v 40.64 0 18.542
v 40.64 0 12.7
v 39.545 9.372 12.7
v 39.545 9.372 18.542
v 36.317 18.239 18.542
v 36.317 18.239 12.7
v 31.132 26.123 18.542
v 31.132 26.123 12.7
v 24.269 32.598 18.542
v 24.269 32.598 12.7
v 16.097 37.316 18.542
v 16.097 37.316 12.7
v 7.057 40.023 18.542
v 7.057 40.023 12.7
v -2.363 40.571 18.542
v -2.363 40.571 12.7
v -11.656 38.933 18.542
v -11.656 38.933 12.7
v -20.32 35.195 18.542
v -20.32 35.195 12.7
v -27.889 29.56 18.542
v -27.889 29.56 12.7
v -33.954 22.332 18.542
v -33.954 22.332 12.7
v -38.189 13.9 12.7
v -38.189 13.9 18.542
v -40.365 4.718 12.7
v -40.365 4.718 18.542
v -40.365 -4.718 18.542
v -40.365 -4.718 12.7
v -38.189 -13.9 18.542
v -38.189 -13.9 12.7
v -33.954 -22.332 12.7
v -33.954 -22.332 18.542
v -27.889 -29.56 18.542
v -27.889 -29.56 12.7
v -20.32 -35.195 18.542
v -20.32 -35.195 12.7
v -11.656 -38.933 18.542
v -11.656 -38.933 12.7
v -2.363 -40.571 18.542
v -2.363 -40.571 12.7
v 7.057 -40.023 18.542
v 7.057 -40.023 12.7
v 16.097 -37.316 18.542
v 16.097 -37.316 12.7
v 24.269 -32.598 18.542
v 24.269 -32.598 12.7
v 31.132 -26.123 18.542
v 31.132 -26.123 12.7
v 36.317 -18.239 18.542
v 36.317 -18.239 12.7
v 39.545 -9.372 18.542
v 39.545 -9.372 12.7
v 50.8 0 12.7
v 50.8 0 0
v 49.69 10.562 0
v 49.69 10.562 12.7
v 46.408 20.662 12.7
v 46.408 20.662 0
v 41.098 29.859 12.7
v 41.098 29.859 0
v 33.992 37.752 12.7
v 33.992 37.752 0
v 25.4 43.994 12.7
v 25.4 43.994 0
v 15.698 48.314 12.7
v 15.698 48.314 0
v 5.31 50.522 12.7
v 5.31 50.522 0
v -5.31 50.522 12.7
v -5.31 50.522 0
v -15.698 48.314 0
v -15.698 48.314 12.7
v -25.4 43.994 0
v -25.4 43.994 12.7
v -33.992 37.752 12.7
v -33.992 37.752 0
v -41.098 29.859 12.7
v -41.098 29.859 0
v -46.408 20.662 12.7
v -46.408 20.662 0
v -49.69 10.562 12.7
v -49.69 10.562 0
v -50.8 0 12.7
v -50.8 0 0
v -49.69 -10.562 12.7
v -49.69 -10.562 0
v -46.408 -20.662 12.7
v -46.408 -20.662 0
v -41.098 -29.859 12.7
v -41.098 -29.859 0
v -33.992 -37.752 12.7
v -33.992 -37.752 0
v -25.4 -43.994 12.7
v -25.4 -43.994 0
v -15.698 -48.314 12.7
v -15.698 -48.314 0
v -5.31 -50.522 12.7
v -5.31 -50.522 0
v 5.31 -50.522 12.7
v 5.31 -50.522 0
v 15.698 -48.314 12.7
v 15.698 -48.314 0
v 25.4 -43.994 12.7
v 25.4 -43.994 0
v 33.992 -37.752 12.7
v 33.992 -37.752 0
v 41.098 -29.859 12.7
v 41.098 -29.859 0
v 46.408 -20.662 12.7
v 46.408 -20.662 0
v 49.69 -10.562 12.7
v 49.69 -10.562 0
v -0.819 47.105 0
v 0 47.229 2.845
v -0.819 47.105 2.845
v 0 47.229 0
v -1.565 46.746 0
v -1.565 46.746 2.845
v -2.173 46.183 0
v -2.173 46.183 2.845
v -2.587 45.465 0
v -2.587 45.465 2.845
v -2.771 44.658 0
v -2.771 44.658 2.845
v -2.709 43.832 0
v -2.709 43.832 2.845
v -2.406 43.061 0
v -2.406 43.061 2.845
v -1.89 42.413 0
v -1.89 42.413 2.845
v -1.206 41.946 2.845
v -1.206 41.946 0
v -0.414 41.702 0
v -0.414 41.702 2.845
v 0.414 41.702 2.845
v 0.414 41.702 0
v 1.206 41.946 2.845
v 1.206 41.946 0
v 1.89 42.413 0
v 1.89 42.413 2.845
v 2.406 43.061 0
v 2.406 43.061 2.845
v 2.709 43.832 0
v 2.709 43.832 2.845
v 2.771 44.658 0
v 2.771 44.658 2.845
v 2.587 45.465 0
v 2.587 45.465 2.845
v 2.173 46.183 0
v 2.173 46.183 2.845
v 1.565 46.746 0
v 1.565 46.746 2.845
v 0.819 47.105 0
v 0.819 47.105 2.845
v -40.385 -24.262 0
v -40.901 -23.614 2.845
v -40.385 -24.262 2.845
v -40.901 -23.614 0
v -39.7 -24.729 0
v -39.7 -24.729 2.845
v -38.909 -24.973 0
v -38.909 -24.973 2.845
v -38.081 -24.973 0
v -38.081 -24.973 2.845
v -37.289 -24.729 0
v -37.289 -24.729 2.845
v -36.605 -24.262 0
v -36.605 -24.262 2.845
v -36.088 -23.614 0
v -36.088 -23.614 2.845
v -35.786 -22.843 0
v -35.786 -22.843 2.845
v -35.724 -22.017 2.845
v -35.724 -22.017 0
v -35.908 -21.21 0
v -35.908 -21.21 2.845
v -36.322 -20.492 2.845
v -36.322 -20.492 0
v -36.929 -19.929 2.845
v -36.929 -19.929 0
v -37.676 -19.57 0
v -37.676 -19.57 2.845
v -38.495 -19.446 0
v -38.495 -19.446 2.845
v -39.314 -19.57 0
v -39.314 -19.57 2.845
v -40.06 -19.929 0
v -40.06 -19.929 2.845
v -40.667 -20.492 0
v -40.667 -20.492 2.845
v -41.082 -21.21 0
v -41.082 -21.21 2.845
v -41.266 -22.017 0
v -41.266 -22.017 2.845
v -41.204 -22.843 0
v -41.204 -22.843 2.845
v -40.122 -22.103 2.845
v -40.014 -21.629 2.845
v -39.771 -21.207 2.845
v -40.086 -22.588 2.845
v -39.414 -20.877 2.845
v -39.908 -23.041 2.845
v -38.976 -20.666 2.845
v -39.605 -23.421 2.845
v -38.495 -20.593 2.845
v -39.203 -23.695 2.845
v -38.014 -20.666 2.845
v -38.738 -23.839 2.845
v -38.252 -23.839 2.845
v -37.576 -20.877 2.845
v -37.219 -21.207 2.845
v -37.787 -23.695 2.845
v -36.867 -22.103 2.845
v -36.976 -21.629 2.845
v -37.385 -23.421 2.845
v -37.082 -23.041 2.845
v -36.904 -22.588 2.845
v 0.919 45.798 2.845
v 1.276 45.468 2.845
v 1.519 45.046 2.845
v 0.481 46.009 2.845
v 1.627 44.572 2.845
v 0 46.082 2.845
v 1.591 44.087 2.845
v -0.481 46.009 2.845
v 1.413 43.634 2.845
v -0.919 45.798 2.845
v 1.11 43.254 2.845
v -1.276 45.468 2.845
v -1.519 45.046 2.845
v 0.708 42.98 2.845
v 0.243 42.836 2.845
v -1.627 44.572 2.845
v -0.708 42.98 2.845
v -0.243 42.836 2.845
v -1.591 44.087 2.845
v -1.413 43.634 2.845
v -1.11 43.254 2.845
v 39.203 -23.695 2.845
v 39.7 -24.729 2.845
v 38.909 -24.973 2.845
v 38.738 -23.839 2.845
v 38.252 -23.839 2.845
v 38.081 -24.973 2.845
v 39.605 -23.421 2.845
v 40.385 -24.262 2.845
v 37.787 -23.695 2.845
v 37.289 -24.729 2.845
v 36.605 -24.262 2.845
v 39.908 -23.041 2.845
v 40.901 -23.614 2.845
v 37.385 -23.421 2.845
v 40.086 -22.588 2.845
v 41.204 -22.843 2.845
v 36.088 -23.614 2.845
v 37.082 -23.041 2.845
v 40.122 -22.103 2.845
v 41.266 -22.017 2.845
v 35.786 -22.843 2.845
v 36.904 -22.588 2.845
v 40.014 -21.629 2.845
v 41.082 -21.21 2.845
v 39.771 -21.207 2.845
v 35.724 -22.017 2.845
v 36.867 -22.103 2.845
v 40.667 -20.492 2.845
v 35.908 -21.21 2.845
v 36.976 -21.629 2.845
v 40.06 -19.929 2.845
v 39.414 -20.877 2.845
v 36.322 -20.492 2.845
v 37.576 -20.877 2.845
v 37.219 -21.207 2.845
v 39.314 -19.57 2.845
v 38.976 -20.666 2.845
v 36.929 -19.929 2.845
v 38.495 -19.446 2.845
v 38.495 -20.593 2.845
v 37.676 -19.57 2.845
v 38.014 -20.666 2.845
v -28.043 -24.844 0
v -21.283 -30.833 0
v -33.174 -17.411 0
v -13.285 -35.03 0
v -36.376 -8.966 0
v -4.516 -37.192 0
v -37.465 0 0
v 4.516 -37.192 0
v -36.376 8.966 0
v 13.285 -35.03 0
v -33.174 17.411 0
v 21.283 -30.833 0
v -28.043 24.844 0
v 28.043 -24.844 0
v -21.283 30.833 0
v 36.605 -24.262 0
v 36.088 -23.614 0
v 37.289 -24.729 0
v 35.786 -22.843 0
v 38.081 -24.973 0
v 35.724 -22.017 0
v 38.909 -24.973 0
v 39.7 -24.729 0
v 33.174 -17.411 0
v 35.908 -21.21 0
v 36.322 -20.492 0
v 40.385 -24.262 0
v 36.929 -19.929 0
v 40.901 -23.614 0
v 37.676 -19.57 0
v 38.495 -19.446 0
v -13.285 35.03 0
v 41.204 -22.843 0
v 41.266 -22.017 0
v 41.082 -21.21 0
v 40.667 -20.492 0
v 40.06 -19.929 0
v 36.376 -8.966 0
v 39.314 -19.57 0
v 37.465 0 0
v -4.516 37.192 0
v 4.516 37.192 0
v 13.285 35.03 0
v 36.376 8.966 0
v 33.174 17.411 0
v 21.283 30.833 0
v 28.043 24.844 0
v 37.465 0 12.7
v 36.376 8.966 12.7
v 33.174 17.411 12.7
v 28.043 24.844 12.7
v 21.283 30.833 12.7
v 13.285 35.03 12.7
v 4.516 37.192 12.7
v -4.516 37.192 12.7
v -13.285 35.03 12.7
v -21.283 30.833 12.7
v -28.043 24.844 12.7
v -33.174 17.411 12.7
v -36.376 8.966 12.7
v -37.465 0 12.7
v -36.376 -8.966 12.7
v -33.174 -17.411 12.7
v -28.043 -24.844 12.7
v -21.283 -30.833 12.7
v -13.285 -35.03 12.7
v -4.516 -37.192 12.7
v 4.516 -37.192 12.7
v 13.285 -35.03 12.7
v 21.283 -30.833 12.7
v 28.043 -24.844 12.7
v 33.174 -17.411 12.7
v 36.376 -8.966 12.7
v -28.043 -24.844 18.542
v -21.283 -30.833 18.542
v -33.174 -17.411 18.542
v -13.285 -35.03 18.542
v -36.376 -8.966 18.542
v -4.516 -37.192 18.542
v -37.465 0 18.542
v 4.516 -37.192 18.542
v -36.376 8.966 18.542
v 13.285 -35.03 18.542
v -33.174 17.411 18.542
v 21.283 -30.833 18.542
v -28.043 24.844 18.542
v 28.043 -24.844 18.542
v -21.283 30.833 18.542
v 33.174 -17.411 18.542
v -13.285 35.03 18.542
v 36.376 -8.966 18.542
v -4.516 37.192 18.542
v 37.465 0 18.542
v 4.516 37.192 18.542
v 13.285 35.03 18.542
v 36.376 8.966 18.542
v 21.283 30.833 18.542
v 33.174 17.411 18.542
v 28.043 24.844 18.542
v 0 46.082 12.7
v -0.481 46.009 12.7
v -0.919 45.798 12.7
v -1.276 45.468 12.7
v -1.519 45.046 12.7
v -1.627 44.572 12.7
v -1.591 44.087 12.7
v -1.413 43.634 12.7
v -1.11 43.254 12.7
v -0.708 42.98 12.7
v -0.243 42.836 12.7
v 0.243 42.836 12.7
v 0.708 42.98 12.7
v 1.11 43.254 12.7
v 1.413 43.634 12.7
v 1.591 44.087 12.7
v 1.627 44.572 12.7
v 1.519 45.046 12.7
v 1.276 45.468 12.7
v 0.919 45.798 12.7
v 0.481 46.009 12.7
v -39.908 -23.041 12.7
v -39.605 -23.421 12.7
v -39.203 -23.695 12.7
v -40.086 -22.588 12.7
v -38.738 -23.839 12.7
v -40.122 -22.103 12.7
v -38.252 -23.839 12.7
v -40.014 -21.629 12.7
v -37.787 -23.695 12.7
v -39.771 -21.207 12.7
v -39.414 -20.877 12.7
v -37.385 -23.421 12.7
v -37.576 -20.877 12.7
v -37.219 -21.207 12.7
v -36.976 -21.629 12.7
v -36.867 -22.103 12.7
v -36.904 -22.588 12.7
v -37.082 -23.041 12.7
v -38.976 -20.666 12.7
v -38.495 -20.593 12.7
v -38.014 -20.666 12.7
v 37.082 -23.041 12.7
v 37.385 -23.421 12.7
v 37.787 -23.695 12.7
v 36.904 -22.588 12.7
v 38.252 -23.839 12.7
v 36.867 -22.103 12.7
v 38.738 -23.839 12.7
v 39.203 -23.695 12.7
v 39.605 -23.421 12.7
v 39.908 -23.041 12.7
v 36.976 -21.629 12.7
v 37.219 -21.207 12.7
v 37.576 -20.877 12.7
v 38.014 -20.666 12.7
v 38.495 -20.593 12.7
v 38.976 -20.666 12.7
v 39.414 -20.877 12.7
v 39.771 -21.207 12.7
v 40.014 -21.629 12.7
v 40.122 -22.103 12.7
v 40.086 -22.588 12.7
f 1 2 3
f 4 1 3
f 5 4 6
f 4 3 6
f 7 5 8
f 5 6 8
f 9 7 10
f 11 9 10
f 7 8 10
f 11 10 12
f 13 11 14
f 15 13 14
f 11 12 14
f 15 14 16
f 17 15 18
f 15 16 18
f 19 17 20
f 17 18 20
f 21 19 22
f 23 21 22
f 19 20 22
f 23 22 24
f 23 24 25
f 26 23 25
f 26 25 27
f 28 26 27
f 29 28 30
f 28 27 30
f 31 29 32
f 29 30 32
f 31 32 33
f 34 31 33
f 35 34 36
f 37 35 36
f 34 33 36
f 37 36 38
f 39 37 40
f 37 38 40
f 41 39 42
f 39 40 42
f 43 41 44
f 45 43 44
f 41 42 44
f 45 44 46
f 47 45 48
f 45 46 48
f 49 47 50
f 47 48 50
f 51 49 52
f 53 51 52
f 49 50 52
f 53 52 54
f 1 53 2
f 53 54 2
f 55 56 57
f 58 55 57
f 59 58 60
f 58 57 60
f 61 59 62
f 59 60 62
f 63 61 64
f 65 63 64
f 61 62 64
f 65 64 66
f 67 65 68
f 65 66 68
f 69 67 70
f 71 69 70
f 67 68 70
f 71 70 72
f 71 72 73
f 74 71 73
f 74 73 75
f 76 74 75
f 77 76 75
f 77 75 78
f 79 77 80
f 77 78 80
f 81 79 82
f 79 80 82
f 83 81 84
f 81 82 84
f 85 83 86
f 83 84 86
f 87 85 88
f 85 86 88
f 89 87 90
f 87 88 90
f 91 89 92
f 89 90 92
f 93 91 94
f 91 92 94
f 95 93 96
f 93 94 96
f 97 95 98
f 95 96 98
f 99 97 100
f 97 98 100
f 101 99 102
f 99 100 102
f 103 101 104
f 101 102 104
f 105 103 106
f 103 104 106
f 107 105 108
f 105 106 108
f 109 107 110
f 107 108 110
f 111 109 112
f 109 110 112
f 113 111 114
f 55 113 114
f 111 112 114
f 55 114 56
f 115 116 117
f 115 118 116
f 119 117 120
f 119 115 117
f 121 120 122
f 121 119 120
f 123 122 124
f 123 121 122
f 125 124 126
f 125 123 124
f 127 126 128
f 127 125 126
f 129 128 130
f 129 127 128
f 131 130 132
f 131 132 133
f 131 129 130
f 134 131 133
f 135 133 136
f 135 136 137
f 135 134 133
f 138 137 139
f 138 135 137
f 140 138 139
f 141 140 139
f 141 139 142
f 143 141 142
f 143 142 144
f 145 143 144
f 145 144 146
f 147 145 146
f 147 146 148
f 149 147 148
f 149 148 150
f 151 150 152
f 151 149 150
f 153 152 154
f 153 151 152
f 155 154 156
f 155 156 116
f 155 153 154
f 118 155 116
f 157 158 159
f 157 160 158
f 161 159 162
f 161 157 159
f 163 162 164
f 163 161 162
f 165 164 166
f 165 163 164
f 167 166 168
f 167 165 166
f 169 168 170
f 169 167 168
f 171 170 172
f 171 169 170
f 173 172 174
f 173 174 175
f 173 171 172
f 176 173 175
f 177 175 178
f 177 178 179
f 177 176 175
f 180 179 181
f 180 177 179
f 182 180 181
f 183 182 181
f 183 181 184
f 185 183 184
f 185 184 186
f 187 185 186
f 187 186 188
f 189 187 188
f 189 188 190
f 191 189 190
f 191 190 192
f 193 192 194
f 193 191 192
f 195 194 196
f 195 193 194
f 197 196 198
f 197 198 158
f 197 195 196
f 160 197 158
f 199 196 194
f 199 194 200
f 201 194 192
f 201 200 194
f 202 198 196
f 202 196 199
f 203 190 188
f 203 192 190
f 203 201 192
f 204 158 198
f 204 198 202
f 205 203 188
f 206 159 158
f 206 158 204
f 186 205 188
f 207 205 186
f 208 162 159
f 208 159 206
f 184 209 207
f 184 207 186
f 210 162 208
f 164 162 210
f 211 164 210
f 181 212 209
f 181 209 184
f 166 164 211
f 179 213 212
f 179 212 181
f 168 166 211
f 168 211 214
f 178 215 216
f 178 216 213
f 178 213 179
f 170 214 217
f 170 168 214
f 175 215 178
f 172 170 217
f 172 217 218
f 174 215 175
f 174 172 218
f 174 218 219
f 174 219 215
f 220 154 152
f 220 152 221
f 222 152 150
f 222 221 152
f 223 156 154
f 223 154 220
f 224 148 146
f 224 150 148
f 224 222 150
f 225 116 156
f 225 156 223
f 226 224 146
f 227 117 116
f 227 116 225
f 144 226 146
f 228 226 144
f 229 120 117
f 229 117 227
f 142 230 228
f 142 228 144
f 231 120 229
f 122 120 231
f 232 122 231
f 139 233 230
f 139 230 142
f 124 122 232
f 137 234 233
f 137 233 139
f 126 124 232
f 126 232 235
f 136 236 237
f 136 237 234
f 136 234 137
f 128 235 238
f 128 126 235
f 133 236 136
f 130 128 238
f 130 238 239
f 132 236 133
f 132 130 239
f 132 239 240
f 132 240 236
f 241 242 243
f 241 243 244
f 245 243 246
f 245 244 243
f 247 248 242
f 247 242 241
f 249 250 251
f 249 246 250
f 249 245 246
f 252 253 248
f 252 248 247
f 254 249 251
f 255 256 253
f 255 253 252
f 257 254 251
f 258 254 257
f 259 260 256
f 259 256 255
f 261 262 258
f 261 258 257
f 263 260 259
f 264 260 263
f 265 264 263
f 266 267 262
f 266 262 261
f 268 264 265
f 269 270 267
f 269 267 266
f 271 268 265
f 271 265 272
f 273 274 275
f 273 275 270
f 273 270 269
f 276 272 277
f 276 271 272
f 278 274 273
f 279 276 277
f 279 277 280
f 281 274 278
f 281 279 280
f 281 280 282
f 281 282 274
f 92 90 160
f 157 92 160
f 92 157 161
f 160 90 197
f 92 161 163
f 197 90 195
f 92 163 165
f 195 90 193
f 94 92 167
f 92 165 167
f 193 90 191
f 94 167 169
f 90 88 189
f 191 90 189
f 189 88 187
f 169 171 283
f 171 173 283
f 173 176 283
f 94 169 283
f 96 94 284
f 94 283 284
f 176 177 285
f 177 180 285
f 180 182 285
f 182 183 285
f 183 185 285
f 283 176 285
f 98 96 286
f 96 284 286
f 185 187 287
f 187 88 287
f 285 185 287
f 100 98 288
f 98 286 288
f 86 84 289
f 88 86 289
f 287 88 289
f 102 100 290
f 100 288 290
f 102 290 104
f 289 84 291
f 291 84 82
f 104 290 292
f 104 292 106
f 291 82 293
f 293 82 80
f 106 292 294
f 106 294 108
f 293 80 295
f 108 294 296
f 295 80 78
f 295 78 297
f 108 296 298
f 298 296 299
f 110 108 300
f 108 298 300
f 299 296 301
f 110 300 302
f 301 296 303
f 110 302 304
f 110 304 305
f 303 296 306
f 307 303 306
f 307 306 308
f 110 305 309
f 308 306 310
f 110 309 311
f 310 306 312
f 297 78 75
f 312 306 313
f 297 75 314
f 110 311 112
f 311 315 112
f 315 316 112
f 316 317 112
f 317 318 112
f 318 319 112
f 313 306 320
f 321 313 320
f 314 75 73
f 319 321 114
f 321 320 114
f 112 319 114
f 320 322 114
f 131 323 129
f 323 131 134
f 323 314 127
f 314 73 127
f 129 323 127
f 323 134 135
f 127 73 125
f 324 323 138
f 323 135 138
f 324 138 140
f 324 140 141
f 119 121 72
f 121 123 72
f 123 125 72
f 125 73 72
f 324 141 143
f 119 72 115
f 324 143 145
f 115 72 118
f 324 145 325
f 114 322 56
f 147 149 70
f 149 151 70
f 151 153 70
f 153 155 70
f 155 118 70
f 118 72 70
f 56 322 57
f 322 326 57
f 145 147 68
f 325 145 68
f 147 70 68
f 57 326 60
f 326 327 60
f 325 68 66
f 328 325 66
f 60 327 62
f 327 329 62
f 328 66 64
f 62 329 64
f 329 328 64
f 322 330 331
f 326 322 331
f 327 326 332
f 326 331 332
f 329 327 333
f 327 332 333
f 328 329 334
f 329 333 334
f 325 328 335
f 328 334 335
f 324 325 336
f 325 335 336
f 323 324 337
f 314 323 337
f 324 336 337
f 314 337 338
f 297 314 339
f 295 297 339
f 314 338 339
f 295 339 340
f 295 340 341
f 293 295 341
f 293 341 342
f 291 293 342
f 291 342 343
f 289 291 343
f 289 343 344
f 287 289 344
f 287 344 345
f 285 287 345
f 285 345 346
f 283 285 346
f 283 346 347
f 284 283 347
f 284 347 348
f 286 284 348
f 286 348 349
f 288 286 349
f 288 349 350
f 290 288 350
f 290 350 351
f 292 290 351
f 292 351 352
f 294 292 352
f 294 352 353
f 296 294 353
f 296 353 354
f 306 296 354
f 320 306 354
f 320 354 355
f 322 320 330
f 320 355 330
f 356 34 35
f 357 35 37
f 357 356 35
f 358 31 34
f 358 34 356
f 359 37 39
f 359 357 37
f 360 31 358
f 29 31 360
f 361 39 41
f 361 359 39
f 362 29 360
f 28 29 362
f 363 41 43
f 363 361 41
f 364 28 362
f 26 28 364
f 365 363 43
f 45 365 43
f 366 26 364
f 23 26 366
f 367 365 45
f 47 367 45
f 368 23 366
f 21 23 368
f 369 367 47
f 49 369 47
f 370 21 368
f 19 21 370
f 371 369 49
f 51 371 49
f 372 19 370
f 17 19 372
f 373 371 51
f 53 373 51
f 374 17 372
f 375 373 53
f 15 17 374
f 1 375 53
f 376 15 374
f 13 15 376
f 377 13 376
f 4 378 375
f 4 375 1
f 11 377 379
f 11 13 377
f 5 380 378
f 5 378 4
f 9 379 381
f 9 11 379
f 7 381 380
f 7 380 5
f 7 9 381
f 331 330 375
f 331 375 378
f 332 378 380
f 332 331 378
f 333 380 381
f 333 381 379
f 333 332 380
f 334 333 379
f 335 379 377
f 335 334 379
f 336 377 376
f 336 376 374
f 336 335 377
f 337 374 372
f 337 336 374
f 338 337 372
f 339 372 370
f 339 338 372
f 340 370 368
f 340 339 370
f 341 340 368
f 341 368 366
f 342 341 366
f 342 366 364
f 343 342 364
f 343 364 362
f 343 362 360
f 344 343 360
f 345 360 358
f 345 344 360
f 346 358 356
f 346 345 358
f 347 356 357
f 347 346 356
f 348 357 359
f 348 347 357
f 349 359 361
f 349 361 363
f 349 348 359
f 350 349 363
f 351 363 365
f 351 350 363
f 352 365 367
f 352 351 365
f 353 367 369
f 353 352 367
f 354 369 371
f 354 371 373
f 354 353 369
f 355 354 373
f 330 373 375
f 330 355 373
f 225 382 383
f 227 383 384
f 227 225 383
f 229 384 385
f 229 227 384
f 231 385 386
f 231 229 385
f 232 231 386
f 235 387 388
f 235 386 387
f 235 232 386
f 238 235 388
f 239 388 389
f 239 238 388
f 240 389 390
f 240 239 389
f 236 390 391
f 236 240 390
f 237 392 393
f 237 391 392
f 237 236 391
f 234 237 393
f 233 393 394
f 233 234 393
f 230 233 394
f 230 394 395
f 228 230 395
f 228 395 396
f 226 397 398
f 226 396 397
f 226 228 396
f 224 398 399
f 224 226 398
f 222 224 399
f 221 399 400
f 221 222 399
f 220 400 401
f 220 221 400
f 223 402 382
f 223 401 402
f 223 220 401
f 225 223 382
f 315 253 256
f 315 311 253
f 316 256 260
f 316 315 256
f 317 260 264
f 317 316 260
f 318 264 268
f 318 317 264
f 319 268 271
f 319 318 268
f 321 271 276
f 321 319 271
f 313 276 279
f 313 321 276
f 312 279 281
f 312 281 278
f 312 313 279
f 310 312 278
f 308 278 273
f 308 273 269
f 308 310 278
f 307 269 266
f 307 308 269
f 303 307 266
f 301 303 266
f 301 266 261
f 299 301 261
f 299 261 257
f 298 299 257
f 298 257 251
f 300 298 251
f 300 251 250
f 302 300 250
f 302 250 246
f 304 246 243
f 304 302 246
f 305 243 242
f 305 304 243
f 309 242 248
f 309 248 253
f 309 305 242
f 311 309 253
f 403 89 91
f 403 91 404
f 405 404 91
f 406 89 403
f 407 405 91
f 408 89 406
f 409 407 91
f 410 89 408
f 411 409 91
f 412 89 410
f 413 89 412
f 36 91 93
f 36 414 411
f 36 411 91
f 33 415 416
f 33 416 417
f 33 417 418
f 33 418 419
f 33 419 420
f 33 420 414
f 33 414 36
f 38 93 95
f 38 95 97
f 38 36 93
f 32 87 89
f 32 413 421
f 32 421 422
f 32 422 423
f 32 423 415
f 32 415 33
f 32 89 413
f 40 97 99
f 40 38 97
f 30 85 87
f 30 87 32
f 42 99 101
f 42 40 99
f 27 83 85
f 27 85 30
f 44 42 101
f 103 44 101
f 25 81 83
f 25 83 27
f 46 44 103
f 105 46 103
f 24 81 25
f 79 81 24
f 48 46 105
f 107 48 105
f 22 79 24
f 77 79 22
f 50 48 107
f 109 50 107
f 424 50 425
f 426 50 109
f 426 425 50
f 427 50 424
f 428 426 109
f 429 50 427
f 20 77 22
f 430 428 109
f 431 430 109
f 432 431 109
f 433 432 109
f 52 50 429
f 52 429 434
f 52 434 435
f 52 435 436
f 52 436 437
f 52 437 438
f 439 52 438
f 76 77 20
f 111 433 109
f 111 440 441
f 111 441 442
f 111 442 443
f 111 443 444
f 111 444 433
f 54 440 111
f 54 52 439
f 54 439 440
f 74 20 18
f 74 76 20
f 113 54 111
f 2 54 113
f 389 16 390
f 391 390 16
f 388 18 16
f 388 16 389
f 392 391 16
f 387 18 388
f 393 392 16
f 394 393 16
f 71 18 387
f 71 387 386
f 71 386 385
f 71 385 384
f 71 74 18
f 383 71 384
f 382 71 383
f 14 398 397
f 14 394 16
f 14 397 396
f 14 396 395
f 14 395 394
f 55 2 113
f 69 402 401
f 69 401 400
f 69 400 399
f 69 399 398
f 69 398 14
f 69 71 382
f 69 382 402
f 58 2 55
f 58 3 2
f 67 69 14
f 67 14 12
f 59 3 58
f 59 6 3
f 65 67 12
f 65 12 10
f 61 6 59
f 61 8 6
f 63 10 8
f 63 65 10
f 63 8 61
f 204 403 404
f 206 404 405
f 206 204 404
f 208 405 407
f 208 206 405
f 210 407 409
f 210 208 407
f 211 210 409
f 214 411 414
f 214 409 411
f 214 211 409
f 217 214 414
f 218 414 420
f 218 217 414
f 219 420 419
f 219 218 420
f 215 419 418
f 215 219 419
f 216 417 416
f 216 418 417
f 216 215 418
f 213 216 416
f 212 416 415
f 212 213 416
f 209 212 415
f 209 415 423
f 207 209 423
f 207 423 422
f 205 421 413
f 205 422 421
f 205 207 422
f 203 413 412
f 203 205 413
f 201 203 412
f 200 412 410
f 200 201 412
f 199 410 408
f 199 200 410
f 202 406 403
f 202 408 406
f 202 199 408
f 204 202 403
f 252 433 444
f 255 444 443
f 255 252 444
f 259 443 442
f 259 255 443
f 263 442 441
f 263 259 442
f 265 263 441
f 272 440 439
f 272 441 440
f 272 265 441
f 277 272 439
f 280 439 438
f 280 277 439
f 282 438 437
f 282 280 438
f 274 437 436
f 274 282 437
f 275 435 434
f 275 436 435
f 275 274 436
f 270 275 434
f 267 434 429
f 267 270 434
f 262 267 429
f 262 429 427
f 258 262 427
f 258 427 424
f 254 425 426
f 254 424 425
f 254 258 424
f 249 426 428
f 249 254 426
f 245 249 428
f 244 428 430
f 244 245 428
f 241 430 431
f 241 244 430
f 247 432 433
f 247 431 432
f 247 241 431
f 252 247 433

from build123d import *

# Parameters (mm, degrees)
SKETCH1_R           = 50.8
BOSS_EXTRUDE1_DEPTH = 12.7
SKETCH2_R           = 40.64
SKETCH2_R_2         = 37.465
BOSS_EXTRUDE2_DEPTH = 5.842
SKETCH4_R           = 37.465
CUT_EXTRUDE1_DEPTH  = 13.7
CIRPATTERN1_COUNT   = 3


with BuildPart() as part:
    # Sketch1 → Boss-Extrude1 (new body)
    with BuildSketch(Plane.XY):
        Circle(SKETCH1_R)
    extrude(amount=BOSS_EXTRUDE1_DEPTH)

    # Sketch2 → Boss-Extrude2 (add)
    with BuildSketch(Plane.XY.offset(12.7)):
        Circle(SKETCH2_R)
        Circle(SKETCH2_R_2, mode=Mode.SUBTRACT)
    extrude(amount=BOSS_EXTRUDE2_DEPTH)

    # Sketch4 → Cut-Extrude1 (cut, through all)
    with BuildSketch(Plane.XY.offset(12.7)):
        Circle(SKETCH4_R)
    extrude(amount=-CUT_EXTRUDE1_DEPTH, mode=Mode.SUBTRACT)

    # Sketch6 → CBORE for #4 Socket Head Cap Screw1 (revolve, cut)
    with BuildSketch(Plane(origin=(0, 44.45, 0), x_dir=(0, 1, 0), z_dir=(1, 0, 0))):
        Polygon((0, 0), (0, 13.807574487), (1.63195, 12.827), (1.63195, 2.8448), (2.77876, 2.8448), (2.77876, 0), align=None)
    cbore_for_4_socket_head_cap_screw1 = revolve(axis=Axis((0, 44.45, -6.35), (0, 0, 1)), mode=Mode.SUBTRACT)

    # CirPattern1: CBORE for #4 Socket Head Cap Screw1 ×3 about axis
    cirpattern1_axis = Axis((0, 0, 0), (0, 0, 1))
    for i in range(1, CIRPATTERN1_COUNT):
        add(cbore_for_4_socket_head_cap_screw1.rotate(cirpattern1_axis, i * 360 / CIRPATTERN1_COUNT), mode=Mode.SUBTRACT)


solid = part.part
